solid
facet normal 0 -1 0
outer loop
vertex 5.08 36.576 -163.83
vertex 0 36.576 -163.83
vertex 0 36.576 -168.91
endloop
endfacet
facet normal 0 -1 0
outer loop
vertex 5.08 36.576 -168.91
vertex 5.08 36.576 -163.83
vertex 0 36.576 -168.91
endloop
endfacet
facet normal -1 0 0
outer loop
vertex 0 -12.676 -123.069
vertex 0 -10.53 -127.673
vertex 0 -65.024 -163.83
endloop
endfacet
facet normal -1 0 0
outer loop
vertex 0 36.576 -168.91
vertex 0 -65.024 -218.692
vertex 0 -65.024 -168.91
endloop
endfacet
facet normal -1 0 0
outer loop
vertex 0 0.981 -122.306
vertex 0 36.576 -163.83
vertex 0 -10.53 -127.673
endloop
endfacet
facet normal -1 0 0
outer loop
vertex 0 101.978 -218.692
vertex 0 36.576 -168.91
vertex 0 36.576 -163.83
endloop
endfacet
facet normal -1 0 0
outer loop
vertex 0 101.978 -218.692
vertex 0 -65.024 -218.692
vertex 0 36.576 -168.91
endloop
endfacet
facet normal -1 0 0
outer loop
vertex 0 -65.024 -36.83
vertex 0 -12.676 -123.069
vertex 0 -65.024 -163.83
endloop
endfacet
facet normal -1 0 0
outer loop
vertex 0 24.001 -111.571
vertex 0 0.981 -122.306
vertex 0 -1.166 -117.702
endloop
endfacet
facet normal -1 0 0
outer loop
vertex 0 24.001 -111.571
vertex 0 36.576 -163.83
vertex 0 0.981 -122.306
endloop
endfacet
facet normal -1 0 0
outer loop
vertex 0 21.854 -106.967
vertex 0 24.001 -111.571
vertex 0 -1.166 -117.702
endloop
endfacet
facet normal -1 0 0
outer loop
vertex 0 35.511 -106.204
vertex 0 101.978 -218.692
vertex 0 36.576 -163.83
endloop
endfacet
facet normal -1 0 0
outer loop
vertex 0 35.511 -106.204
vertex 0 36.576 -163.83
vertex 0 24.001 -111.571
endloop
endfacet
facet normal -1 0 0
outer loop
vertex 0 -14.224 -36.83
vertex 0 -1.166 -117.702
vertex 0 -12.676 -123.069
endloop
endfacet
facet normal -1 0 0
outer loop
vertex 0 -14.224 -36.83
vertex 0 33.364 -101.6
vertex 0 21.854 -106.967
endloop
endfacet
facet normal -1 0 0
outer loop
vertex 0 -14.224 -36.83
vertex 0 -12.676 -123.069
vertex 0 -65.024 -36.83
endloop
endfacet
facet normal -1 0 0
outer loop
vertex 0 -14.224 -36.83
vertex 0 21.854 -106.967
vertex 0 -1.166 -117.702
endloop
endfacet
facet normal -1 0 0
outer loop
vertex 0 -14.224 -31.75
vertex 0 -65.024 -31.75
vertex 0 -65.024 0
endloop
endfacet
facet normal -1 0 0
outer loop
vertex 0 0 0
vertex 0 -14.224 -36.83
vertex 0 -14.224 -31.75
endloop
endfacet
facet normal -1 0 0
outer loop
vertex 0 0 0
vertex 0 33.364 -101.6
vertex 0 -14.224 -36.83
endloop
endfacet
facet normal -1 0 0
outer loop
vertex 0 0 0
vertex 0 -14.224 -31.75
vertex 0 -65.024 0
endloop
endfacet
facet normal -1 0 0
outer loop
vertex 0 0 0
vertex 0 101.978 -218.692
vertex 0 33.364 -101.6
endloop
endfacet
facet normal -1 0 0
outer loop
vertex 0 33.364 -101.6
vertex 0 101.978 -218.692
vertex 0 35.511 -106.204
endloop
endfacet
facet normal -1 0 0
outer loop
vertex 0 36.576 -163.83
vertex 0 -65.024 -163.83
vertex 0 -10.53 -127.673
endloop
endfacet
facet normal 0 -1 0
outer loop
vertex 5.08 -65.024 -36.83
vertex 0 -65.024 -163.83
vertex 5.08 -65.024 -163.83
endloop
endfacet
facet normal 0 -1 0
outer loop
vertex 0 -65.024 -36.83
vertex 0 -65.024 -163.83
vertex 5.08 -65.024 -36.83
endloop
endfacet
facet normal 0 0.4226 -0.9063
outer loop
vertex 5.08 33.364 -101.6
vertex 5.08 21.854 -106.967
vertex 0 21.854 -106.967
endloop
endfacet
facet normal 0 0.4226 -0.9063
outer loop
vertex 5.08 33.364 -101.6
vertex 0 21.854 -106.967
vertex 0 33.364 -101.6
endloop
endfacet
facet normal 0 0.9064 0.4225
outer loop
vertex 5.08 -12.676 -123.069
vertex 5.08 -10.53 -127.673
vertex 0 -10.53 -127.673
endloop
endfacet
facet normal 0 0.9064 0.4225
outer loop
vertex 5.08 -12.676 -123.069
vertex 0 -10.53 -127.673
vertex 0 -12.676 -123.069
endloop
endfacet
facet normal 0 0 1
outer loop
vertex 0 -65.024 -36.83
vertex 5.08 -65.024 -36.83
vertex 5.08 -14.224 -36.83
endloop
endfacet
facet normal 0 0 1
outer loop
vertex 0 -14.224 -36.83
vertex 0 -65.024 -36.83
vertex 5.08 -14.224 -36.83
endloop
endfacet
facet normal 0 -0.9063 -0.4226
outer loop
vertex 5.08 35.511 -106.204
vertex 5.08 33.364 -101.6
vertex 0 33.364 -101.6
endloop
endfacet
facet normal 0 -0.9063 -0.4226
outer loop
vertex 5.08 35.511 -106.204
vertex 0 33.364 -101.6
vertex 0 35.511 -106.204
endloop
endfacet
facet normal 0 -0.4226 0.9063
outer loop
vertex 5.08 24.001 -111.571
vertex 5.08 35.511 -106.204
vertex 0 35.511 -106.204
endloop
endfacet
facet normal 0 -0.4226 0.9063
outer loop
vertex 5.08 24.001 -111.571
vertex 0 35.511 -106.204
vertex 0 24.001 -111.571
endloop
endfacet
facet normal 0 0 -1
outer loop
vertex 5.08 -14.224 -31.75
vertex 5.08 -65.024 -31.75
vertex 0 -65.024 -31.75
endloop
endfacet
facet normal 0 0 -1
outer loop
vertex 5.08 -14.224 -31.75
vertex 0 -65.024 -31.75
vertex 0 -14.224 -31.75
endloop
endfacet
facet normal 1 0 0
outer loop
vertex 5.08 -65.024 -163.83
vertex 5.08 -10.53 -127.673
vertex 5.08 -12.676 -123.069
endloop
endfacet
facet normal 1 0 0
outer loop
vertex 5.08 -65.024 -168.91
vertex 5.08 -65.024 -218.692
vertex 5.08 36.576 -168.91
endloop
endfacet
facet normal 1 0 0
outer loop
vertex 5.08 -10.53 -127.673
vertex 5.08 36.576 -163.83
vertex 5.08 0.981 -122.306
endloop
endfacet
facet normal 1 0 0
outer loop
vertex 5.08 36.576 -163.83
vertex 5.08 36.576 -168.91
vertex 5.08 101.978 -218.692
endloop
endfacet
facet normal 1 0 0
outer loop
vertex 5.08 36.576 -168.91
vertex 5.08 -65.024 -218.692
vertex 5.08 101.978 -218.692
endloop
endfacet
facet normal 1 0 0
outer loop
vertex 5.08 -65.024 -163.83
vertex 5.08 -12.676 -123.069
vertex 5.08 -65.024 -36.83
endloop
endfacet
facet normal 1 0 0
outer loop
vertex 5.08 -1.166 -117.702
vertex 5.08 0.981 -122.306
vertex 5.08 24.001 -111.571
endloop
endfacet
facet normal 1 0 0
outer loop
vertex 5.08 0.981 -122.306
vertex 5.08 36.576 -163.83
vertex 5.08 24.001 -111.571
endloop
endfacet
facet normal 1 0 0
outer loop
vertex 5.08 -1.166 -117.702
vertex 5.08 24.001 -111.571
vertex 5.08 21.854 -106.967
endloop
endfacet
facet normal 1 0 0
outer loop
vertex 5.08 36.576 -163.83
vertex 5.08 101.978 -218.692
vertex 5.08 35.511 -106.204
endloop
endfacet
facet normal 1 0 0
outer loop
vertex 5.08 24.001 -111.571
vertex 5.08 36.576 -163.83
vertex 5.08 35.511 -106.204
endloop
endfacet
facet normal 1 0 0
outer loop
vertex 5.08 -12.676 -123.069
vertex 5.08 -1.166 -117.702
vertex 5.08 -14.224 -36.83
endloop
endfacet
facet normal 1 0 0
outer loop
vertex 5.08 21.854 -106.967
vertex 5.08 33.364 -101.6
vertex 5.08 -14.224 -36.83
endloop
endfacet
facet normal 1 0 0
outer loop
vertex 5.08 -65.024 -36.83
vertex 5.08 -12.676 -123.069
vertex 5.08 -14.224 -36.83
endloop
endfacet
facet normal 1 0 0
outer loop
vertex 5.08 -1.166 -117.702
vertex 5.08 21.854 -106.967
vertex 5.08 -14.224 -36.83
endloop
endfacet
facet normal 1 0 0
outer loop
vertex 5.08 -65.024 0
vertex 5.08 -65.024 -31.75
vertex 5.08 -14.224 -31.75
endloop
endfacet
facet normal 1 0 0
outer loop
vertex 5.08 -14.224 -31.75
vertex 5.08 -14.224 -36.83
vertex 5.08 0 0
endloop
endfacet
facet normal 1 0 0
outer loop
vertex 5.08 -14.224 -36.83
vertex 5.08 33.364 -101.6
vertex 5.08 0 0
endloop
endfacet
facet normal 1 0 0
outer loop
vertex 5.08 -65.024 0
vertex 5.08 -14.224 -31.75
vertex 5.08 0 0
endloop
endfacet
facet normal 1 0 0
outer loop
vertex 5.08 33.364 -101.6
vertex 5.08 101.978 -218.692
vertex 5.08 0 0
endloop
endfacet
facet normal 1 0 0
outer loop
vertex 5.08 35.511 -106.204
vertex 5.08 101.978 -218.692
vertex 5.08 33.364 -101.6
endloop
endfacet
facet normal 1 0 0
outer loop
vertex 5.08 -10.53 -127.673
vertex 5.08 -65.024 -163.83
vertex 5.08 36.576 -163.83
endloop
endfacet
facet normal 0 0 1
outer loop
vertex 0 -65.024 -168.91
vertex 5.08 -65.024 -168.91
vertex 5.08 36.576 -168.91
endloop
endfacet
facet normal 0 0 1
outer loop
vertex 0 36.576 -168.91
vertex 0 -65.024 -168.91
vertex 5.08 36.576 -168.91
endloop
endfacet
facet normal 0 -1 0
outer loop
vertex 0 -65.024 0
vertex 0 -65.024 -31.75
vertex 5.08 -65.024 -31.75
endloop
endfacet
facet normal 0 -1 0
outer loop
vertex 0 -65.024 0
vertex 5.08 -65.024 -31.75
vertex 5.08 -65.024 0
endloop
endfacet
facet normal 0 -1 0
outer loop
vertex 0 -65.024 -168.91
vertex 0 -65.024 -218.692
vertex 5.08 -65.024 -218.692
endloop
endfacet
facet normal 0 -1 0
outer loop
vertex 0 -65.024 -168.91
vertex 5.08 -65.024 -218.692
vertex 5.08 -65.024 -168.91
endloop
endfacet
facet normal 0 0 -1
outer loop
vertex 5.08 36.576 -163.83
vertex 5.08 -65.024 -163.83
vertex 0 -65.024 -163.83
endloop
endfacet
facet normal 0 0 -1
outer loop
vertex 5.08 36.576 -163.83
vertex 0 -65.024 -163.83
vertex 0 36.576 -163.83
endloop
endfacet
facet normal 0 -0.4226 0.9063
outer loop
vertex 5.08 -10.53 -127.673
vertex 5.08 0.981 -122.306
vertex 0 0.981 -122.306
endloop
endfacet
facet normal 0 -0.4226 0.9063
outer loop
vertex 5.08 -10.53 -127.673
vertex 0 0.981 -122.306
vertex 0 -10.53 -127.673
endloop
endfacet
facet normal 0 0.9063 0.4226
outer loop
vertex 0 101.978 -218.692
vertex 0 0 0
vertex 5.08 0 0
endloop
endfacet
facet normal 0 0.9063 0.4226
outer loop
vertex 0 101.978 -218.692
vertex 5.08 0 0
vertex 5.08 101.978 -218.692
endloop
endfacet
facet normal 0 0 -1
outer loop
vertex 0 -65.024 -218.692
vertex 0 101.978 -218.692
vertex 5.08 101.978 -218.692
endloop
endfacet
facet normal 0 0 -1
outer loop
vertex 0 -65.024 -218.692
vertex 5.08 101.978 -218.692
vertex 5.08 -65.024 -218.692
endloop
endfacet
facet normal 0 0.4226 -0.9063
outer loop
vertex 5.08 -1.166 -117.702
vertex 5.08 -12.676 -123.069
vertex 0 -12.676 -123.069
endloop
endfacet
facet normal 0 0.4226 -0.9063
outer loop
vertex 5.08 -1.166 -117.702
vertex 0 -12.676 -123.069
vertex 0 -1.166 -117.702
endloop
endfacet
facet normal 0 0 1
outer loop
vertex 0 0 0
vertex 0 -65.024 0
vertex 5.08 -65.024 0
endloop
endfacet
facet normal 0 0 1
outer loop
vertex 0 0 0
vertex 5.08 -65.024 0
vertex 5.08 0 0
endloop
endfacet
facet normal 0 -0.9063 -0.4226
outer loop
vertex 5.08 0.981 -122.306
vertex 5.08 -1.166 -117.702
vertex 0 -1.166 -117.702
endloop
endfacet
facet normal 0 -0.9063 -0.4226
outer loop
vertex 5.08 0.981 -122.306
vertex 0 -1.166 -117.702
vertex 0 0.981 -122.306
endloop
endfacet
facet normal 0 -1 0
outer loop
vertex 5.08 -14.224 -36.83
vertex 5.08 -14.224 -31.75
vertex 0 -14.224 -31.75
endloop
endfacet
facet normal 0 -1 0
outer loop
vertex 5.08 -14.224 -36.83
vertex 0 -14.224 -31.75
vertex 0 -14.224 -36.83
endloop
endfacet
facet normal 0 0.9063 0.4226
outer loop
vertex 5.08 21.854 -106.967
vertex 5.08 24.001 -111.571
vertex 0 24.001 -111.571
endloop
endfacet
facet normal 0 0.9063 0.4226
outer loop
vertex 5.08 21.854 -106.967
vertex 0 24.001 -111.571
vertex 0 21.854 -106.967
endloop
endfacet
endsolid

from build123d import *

# Parameters (mm, degrees)
BOSS_EXTRUDE1_DEPTH = 5.08
CUT_EXTRUDE1_DEPTH  = 6.08
LPATTERN1_COUNT     = 2
LPATTERN1_PITCH     = 38.1
SKETCH3_W           = 5.08
SKETCH3_H           = 50.8
SKETCH3_H_2         = 101.6
CUT_EXTRUDE2_DEPTH  = 6.08


with BuildPart() as part:
    # Sketch1 → Boss-Extrude1 (new body)
    with BuildSketch(Plane(origin=(0, 0, 0), x_dir=(0, 0, -1), z_dir=(1, 0, 0))):
        Polygon((0, 0), (218.692069012, 101.977786558), (218.692069012, -65.024), (0, -65.024), align=None)
    extrude(amount=BOSS_EXTRUDE1_DEPTH)

    # Sketch2 → Cut-Extrude1 (cut, through all)
    with BuildSketch(Plane(origin=(5.08, 0, 0), x_dir=(0, 0, -1), z_dir=(1, 0, 0))):
        Polygon((101.6, 33.363958498), (106.204043558, 35.510859267), (111.571295482, 24.000750372), (106.967251924, 21.853849602), align=None)
    cut_extrude1 = extrude(amount=-CUT_EXTRUDE1_DEPTH, mode=Mode.SUBTRACT)

    # LPattern1: Cut-Extrude1 ×2
    with Locations(*[Vector(0, -0.906307787, -0.422618262) * (i * LPATTERN1_PITCH) for i in range(1, LPATTERN1_COUNT)]):
        add(cut_extrude1, mode=Mode.SUBTRACT)

    # Sketch3 → Cut-Extrude2 (cut, through all)
    with BuildSketch(Plane(origin=(5.08, 0, 0), x_dir=(0, 0, -1), z_dir=(1, 0, 0))):
        with Locations((34.29, -39.624)):
            Rectangle(SKETCH3_W, SKETCH3_H)
        with Locations((166.37, -14.224)):
            Rectangle(SKETCH3_W, SKETCH3_H_2)
    extrude(amount=-CUT_EXTRUDE2_DEPTH, mode=Mode.SUBTRACT)


solid = part.part
